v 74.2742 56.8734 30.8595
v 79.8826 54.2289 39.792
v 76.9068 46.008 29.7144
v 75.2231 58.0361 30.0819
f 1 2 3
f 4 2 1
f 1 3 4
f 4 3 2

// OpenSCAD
// Auto-generated auxetic polyhedron
points = [
    [76.906811, 46.008003, 29.714391],
    [79.882648, 54.228856, 39.791988],
    [74.274240, 56.873353, 30.859511],
    [75.223071, 58.036103, 30.081857],
];

faces = [
    [0, 1, 2],
    [2, 1, 3],
    [3, 0, 2],
    [1, 0, 3],
];

polyhedron(points = points, faces = faces);
